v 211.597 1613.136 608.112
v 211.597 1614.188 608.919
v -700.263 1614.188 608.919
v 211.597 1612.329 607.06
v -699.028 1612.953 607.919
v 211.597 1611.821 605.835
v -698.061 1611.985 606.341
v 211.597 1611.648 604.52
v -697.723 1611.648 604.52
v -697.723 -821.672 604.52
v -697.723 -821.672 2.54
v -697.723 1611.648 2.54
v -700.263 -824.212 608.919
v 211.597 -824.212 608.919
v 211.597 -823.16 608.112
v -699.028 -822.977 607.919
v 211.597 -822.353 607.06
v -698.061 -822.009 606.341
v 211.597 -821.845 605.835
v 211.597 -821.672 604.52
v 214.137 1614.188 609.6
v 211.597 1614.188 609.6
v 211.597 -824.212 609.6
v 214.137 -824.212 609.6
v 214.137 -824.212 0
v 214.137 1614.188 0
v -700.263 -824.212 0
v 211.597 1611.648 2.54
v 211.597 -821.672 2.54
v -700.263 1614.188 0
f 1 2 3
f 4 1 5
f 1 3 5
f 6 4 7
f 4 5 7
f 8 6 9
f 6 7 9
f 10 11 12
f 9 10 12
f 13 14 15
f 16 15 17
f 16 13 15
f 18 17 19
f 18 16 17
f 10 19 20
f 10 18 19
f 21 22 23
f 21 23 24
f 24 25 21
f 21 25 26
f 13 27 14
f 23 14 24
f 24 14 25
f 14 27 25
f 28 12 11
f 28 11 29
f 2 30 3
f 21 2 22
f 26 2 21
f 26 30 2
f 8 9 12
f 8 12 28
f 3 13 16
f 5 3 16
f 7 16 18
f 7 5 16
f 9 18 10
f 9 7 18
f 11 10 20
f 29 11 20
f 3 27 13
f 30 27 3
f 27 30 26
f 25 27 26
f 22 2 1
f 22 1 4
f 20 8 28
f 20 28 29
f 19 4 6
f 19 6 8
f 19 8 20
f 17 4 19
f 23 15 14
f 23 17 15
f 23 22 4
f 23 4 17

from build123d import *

# Parameters (mm, degrees)
F0_W         = 914.4
F0_H         = 2438.4
F1_DEPTH     = 609.6
F3_T         = -2.54
F4_T1_DEPTH  = 2433.32
F4_T3_DEPTH  = 909.32
F4_T9_DEPTH  = 2446.02
F4_T15_DEPTH = 922.02
F4_T24_DEPTH = 2446.02
F4_T30_DEPTH = 922.02


# Not quite as in the source:
# - a fillet or chamfer that OpenCascade refuses, or shapes differently, is made with other operations: its cross-section is extruded or revolved along the edge and cut away or added


with BuildPart() as f1:
    # F0 (on Top) → F1 (new body)
    with BuildSketch(Plane.XY):
        with Locations((-243.063261795, 394.9879257202)):
            Rectangle(F0_W, F0_H)
    extrude(amount=F1_DEPTH)

    # F3
    f3_openings = [f1.faces().sort_by_distance(p)[0] for p in [
        (-243.063262, 394.987926, 609.6),
    ]]
    offset(amount=F3_T, openings=f3_openings)

    # F4: fillet of radius 5.08 on 3 edges, made by hand

    # F4_s2 → F4_t1 (cut)
    with BuildSketch(Plane.XZ.offset(-1611.6479257202)):
        with BuildLine():
            ThreePointArc((-702.803261795, 609.6), (-699.2111593466, 608.1121024484), (-697.723261795, 604.52))
            Line((-697.723261795, 604.52), (-697.723261795, 609.6))
            Line((-697.723261795, 609.6), (-702.803261795, 609.6))
        make_face()
    extrude(amount=F4_T1_DEPTH, mode=Mode.SUBTRACT)

    # F4_s4 → F4_t3 (cut)
    with BuildSketch(Plane.YZ.offset(-697.723261795)):
        with BuildLine():
            ThreePointArc((-826.7520742798, 609.6), (-823.1599718314, 608.1121024484), (-821.6720742798, 604.52))
            Line((-821.6720742798, 604.52), (-821.6720742798, 609.6))
            Line((-821.6720742798, 609.6), (-826.7520742798, 609.6))
        make_face()
        with BuildLine():
            ThreePointArc((1616.7279257202, 609.6), (1613.1358232718, 608.1121024484), (1611.6479257202, 604.52))
            Line((1611.6479257202, 604.52), (1611.6479257202, 609.6))
            Line((1611.6479257202, 609.6), (1616.7279257202, 609.6))
        make_face()
    extrude(amount=F4_T3_DEPTH, mode=Mode.SUBTRACT)


with BuildPart() as f4_tool7:
    # F4_s8 → F4_t9 (new body)
    with BuildSketch(Plane.XZ.offset(-1624.3479257202)):
        with BuildLine():
            ThreePointArc((-702.803261795, 609.6), (-699.2111593466, 608.1121024484), (-697.723261795, 604.52))
            Line((-697.723261795, 604.52), (-697.723261795, 609.6))
            Line((-697.723261795, 609.6), (-702.803261795, 609.6))
        make_face()
    extrude(amount=F4_T9_DEPTH)

    split(bisect_by=Plane.YZ.offset(-700.263261795), keep=Keep.TOP)

    split(bisect_by=Plane.XZ.offset(-1614.1879257202), keep=Keep.TOP)

    split(bisect_by=Plane.XZ.offset(-1611.6479257202), keep=Keep.BOTTOM)


with BuildPart() as f4_tool13:
    # F4_s14 → F4_t15 (new body)
    with BuildSketch(Plane.YZ.offset(211.596738205)):
        with BuildLine():
            ThreePointArc((1616.7279257202, 609.6), (1613.1358232718, 608.1121024484), (1611.6479257202, 604.52))
            Line((1611.6479257202, 604.52), (1611.6479257202, 609.6))
            Line((1611.6479257202, 609.6), (1616.7279257202, 609.6))
        make_face()
    extrude(amount=-F4_T15_DEPTH)

    split(bisect_by=Plane.YZ.offset(-700.263261795), keep=Keep.TOP)

    split(bisect_by=Plane.XZ.offset(-1614.1879257202), keep=Keep.TOP)

    split(bisect_by=Plane.YZ.offset(-697.723261795), keep=Keep.BOTTOM)


with BuildPart() as f4_tool7_1:
    add(f4_tool7.part)

    # F4_t19: intersect F4_tool13
    add(f4_tool13.part, mode=Mode.INTERSECT)


with BuildPart() as f1_1:
    add(f1.part)

    # F4_t5: cut F4_tool7
    add(f4_tool7_1.part, mode=Mode.SUBTRACT)


with BuildPart() as f4_tool22:
    # F4_s23 → F4_t24 (new body)
    with BuildSketch(Plane.XZ.offset(-1611.6479257202)):
        with BuildLine():
            ThreePointArc((-702.803261795, 609.6), (-699.2111593466, 608.1121024484), (-697.723261795, 604.52))
            Line((-697.723261795, 604.52), (-697.723261795, 609.6))
            Line((-697.723261795, 609.6), (-702.803261795, 609.6))
        make_face()
    extrude(amount=F4_T24_DEPTH)

    split(bisect_by=Plane.YZ.offset(-700.263261795), keep=Keep.TOP)

    split(bisect_by=Plane.XZ.offset(824.2120742798), keep=Keep.BOTTOM)

    split(bisect_by=Plane.XZ.offset(821.6720742798), keep=Keep.TOP)


with BuildPart() as f4_tool28:
    # F4_s29 → F4_t30 (new body)
    with BuildSketch(Plane.YZ.offset(-710.423261795)):
        with BuildLine():
            ThreePointArc((-826.7520742798, 609.6), (-823.1599718314, 608.1121024484), (-821.6720742798, 604.52))
            Line((-821.6720742798, 604.52), (-821.6720742798, 609.6))
            Line((-821.6720742798, 609.6), (-826.7520742798, 609.6))
        make_face()
    extrude(amount=F4_T30_DEPTH)

    split(bisect_by=Plane.YZ.offset(-700.263261795), keep=Keep.TOP)

    split(bisect_by=Plane.XZ.offset(824.2120742798), keep=Keep.BOTTOM)

    split(bisect_by=Plane.YZ.offset(-697.723261795), keep=Keep.BOTTOM)


with BuildPart() as f4_tool22_1:
    add(f4_tool22.part)

    # F4_t34: intersect F4_tool28
    add(f4_tool28.part, mode=Mode.INTERSECT)


with BuildPart() as f1_2:
    add(f1_1.part)

    # F4_t20: cut F4_tool22
    add(f4_tool22_1.part, mode=Mode.SUBTRACT)


solid = f1_2.part
